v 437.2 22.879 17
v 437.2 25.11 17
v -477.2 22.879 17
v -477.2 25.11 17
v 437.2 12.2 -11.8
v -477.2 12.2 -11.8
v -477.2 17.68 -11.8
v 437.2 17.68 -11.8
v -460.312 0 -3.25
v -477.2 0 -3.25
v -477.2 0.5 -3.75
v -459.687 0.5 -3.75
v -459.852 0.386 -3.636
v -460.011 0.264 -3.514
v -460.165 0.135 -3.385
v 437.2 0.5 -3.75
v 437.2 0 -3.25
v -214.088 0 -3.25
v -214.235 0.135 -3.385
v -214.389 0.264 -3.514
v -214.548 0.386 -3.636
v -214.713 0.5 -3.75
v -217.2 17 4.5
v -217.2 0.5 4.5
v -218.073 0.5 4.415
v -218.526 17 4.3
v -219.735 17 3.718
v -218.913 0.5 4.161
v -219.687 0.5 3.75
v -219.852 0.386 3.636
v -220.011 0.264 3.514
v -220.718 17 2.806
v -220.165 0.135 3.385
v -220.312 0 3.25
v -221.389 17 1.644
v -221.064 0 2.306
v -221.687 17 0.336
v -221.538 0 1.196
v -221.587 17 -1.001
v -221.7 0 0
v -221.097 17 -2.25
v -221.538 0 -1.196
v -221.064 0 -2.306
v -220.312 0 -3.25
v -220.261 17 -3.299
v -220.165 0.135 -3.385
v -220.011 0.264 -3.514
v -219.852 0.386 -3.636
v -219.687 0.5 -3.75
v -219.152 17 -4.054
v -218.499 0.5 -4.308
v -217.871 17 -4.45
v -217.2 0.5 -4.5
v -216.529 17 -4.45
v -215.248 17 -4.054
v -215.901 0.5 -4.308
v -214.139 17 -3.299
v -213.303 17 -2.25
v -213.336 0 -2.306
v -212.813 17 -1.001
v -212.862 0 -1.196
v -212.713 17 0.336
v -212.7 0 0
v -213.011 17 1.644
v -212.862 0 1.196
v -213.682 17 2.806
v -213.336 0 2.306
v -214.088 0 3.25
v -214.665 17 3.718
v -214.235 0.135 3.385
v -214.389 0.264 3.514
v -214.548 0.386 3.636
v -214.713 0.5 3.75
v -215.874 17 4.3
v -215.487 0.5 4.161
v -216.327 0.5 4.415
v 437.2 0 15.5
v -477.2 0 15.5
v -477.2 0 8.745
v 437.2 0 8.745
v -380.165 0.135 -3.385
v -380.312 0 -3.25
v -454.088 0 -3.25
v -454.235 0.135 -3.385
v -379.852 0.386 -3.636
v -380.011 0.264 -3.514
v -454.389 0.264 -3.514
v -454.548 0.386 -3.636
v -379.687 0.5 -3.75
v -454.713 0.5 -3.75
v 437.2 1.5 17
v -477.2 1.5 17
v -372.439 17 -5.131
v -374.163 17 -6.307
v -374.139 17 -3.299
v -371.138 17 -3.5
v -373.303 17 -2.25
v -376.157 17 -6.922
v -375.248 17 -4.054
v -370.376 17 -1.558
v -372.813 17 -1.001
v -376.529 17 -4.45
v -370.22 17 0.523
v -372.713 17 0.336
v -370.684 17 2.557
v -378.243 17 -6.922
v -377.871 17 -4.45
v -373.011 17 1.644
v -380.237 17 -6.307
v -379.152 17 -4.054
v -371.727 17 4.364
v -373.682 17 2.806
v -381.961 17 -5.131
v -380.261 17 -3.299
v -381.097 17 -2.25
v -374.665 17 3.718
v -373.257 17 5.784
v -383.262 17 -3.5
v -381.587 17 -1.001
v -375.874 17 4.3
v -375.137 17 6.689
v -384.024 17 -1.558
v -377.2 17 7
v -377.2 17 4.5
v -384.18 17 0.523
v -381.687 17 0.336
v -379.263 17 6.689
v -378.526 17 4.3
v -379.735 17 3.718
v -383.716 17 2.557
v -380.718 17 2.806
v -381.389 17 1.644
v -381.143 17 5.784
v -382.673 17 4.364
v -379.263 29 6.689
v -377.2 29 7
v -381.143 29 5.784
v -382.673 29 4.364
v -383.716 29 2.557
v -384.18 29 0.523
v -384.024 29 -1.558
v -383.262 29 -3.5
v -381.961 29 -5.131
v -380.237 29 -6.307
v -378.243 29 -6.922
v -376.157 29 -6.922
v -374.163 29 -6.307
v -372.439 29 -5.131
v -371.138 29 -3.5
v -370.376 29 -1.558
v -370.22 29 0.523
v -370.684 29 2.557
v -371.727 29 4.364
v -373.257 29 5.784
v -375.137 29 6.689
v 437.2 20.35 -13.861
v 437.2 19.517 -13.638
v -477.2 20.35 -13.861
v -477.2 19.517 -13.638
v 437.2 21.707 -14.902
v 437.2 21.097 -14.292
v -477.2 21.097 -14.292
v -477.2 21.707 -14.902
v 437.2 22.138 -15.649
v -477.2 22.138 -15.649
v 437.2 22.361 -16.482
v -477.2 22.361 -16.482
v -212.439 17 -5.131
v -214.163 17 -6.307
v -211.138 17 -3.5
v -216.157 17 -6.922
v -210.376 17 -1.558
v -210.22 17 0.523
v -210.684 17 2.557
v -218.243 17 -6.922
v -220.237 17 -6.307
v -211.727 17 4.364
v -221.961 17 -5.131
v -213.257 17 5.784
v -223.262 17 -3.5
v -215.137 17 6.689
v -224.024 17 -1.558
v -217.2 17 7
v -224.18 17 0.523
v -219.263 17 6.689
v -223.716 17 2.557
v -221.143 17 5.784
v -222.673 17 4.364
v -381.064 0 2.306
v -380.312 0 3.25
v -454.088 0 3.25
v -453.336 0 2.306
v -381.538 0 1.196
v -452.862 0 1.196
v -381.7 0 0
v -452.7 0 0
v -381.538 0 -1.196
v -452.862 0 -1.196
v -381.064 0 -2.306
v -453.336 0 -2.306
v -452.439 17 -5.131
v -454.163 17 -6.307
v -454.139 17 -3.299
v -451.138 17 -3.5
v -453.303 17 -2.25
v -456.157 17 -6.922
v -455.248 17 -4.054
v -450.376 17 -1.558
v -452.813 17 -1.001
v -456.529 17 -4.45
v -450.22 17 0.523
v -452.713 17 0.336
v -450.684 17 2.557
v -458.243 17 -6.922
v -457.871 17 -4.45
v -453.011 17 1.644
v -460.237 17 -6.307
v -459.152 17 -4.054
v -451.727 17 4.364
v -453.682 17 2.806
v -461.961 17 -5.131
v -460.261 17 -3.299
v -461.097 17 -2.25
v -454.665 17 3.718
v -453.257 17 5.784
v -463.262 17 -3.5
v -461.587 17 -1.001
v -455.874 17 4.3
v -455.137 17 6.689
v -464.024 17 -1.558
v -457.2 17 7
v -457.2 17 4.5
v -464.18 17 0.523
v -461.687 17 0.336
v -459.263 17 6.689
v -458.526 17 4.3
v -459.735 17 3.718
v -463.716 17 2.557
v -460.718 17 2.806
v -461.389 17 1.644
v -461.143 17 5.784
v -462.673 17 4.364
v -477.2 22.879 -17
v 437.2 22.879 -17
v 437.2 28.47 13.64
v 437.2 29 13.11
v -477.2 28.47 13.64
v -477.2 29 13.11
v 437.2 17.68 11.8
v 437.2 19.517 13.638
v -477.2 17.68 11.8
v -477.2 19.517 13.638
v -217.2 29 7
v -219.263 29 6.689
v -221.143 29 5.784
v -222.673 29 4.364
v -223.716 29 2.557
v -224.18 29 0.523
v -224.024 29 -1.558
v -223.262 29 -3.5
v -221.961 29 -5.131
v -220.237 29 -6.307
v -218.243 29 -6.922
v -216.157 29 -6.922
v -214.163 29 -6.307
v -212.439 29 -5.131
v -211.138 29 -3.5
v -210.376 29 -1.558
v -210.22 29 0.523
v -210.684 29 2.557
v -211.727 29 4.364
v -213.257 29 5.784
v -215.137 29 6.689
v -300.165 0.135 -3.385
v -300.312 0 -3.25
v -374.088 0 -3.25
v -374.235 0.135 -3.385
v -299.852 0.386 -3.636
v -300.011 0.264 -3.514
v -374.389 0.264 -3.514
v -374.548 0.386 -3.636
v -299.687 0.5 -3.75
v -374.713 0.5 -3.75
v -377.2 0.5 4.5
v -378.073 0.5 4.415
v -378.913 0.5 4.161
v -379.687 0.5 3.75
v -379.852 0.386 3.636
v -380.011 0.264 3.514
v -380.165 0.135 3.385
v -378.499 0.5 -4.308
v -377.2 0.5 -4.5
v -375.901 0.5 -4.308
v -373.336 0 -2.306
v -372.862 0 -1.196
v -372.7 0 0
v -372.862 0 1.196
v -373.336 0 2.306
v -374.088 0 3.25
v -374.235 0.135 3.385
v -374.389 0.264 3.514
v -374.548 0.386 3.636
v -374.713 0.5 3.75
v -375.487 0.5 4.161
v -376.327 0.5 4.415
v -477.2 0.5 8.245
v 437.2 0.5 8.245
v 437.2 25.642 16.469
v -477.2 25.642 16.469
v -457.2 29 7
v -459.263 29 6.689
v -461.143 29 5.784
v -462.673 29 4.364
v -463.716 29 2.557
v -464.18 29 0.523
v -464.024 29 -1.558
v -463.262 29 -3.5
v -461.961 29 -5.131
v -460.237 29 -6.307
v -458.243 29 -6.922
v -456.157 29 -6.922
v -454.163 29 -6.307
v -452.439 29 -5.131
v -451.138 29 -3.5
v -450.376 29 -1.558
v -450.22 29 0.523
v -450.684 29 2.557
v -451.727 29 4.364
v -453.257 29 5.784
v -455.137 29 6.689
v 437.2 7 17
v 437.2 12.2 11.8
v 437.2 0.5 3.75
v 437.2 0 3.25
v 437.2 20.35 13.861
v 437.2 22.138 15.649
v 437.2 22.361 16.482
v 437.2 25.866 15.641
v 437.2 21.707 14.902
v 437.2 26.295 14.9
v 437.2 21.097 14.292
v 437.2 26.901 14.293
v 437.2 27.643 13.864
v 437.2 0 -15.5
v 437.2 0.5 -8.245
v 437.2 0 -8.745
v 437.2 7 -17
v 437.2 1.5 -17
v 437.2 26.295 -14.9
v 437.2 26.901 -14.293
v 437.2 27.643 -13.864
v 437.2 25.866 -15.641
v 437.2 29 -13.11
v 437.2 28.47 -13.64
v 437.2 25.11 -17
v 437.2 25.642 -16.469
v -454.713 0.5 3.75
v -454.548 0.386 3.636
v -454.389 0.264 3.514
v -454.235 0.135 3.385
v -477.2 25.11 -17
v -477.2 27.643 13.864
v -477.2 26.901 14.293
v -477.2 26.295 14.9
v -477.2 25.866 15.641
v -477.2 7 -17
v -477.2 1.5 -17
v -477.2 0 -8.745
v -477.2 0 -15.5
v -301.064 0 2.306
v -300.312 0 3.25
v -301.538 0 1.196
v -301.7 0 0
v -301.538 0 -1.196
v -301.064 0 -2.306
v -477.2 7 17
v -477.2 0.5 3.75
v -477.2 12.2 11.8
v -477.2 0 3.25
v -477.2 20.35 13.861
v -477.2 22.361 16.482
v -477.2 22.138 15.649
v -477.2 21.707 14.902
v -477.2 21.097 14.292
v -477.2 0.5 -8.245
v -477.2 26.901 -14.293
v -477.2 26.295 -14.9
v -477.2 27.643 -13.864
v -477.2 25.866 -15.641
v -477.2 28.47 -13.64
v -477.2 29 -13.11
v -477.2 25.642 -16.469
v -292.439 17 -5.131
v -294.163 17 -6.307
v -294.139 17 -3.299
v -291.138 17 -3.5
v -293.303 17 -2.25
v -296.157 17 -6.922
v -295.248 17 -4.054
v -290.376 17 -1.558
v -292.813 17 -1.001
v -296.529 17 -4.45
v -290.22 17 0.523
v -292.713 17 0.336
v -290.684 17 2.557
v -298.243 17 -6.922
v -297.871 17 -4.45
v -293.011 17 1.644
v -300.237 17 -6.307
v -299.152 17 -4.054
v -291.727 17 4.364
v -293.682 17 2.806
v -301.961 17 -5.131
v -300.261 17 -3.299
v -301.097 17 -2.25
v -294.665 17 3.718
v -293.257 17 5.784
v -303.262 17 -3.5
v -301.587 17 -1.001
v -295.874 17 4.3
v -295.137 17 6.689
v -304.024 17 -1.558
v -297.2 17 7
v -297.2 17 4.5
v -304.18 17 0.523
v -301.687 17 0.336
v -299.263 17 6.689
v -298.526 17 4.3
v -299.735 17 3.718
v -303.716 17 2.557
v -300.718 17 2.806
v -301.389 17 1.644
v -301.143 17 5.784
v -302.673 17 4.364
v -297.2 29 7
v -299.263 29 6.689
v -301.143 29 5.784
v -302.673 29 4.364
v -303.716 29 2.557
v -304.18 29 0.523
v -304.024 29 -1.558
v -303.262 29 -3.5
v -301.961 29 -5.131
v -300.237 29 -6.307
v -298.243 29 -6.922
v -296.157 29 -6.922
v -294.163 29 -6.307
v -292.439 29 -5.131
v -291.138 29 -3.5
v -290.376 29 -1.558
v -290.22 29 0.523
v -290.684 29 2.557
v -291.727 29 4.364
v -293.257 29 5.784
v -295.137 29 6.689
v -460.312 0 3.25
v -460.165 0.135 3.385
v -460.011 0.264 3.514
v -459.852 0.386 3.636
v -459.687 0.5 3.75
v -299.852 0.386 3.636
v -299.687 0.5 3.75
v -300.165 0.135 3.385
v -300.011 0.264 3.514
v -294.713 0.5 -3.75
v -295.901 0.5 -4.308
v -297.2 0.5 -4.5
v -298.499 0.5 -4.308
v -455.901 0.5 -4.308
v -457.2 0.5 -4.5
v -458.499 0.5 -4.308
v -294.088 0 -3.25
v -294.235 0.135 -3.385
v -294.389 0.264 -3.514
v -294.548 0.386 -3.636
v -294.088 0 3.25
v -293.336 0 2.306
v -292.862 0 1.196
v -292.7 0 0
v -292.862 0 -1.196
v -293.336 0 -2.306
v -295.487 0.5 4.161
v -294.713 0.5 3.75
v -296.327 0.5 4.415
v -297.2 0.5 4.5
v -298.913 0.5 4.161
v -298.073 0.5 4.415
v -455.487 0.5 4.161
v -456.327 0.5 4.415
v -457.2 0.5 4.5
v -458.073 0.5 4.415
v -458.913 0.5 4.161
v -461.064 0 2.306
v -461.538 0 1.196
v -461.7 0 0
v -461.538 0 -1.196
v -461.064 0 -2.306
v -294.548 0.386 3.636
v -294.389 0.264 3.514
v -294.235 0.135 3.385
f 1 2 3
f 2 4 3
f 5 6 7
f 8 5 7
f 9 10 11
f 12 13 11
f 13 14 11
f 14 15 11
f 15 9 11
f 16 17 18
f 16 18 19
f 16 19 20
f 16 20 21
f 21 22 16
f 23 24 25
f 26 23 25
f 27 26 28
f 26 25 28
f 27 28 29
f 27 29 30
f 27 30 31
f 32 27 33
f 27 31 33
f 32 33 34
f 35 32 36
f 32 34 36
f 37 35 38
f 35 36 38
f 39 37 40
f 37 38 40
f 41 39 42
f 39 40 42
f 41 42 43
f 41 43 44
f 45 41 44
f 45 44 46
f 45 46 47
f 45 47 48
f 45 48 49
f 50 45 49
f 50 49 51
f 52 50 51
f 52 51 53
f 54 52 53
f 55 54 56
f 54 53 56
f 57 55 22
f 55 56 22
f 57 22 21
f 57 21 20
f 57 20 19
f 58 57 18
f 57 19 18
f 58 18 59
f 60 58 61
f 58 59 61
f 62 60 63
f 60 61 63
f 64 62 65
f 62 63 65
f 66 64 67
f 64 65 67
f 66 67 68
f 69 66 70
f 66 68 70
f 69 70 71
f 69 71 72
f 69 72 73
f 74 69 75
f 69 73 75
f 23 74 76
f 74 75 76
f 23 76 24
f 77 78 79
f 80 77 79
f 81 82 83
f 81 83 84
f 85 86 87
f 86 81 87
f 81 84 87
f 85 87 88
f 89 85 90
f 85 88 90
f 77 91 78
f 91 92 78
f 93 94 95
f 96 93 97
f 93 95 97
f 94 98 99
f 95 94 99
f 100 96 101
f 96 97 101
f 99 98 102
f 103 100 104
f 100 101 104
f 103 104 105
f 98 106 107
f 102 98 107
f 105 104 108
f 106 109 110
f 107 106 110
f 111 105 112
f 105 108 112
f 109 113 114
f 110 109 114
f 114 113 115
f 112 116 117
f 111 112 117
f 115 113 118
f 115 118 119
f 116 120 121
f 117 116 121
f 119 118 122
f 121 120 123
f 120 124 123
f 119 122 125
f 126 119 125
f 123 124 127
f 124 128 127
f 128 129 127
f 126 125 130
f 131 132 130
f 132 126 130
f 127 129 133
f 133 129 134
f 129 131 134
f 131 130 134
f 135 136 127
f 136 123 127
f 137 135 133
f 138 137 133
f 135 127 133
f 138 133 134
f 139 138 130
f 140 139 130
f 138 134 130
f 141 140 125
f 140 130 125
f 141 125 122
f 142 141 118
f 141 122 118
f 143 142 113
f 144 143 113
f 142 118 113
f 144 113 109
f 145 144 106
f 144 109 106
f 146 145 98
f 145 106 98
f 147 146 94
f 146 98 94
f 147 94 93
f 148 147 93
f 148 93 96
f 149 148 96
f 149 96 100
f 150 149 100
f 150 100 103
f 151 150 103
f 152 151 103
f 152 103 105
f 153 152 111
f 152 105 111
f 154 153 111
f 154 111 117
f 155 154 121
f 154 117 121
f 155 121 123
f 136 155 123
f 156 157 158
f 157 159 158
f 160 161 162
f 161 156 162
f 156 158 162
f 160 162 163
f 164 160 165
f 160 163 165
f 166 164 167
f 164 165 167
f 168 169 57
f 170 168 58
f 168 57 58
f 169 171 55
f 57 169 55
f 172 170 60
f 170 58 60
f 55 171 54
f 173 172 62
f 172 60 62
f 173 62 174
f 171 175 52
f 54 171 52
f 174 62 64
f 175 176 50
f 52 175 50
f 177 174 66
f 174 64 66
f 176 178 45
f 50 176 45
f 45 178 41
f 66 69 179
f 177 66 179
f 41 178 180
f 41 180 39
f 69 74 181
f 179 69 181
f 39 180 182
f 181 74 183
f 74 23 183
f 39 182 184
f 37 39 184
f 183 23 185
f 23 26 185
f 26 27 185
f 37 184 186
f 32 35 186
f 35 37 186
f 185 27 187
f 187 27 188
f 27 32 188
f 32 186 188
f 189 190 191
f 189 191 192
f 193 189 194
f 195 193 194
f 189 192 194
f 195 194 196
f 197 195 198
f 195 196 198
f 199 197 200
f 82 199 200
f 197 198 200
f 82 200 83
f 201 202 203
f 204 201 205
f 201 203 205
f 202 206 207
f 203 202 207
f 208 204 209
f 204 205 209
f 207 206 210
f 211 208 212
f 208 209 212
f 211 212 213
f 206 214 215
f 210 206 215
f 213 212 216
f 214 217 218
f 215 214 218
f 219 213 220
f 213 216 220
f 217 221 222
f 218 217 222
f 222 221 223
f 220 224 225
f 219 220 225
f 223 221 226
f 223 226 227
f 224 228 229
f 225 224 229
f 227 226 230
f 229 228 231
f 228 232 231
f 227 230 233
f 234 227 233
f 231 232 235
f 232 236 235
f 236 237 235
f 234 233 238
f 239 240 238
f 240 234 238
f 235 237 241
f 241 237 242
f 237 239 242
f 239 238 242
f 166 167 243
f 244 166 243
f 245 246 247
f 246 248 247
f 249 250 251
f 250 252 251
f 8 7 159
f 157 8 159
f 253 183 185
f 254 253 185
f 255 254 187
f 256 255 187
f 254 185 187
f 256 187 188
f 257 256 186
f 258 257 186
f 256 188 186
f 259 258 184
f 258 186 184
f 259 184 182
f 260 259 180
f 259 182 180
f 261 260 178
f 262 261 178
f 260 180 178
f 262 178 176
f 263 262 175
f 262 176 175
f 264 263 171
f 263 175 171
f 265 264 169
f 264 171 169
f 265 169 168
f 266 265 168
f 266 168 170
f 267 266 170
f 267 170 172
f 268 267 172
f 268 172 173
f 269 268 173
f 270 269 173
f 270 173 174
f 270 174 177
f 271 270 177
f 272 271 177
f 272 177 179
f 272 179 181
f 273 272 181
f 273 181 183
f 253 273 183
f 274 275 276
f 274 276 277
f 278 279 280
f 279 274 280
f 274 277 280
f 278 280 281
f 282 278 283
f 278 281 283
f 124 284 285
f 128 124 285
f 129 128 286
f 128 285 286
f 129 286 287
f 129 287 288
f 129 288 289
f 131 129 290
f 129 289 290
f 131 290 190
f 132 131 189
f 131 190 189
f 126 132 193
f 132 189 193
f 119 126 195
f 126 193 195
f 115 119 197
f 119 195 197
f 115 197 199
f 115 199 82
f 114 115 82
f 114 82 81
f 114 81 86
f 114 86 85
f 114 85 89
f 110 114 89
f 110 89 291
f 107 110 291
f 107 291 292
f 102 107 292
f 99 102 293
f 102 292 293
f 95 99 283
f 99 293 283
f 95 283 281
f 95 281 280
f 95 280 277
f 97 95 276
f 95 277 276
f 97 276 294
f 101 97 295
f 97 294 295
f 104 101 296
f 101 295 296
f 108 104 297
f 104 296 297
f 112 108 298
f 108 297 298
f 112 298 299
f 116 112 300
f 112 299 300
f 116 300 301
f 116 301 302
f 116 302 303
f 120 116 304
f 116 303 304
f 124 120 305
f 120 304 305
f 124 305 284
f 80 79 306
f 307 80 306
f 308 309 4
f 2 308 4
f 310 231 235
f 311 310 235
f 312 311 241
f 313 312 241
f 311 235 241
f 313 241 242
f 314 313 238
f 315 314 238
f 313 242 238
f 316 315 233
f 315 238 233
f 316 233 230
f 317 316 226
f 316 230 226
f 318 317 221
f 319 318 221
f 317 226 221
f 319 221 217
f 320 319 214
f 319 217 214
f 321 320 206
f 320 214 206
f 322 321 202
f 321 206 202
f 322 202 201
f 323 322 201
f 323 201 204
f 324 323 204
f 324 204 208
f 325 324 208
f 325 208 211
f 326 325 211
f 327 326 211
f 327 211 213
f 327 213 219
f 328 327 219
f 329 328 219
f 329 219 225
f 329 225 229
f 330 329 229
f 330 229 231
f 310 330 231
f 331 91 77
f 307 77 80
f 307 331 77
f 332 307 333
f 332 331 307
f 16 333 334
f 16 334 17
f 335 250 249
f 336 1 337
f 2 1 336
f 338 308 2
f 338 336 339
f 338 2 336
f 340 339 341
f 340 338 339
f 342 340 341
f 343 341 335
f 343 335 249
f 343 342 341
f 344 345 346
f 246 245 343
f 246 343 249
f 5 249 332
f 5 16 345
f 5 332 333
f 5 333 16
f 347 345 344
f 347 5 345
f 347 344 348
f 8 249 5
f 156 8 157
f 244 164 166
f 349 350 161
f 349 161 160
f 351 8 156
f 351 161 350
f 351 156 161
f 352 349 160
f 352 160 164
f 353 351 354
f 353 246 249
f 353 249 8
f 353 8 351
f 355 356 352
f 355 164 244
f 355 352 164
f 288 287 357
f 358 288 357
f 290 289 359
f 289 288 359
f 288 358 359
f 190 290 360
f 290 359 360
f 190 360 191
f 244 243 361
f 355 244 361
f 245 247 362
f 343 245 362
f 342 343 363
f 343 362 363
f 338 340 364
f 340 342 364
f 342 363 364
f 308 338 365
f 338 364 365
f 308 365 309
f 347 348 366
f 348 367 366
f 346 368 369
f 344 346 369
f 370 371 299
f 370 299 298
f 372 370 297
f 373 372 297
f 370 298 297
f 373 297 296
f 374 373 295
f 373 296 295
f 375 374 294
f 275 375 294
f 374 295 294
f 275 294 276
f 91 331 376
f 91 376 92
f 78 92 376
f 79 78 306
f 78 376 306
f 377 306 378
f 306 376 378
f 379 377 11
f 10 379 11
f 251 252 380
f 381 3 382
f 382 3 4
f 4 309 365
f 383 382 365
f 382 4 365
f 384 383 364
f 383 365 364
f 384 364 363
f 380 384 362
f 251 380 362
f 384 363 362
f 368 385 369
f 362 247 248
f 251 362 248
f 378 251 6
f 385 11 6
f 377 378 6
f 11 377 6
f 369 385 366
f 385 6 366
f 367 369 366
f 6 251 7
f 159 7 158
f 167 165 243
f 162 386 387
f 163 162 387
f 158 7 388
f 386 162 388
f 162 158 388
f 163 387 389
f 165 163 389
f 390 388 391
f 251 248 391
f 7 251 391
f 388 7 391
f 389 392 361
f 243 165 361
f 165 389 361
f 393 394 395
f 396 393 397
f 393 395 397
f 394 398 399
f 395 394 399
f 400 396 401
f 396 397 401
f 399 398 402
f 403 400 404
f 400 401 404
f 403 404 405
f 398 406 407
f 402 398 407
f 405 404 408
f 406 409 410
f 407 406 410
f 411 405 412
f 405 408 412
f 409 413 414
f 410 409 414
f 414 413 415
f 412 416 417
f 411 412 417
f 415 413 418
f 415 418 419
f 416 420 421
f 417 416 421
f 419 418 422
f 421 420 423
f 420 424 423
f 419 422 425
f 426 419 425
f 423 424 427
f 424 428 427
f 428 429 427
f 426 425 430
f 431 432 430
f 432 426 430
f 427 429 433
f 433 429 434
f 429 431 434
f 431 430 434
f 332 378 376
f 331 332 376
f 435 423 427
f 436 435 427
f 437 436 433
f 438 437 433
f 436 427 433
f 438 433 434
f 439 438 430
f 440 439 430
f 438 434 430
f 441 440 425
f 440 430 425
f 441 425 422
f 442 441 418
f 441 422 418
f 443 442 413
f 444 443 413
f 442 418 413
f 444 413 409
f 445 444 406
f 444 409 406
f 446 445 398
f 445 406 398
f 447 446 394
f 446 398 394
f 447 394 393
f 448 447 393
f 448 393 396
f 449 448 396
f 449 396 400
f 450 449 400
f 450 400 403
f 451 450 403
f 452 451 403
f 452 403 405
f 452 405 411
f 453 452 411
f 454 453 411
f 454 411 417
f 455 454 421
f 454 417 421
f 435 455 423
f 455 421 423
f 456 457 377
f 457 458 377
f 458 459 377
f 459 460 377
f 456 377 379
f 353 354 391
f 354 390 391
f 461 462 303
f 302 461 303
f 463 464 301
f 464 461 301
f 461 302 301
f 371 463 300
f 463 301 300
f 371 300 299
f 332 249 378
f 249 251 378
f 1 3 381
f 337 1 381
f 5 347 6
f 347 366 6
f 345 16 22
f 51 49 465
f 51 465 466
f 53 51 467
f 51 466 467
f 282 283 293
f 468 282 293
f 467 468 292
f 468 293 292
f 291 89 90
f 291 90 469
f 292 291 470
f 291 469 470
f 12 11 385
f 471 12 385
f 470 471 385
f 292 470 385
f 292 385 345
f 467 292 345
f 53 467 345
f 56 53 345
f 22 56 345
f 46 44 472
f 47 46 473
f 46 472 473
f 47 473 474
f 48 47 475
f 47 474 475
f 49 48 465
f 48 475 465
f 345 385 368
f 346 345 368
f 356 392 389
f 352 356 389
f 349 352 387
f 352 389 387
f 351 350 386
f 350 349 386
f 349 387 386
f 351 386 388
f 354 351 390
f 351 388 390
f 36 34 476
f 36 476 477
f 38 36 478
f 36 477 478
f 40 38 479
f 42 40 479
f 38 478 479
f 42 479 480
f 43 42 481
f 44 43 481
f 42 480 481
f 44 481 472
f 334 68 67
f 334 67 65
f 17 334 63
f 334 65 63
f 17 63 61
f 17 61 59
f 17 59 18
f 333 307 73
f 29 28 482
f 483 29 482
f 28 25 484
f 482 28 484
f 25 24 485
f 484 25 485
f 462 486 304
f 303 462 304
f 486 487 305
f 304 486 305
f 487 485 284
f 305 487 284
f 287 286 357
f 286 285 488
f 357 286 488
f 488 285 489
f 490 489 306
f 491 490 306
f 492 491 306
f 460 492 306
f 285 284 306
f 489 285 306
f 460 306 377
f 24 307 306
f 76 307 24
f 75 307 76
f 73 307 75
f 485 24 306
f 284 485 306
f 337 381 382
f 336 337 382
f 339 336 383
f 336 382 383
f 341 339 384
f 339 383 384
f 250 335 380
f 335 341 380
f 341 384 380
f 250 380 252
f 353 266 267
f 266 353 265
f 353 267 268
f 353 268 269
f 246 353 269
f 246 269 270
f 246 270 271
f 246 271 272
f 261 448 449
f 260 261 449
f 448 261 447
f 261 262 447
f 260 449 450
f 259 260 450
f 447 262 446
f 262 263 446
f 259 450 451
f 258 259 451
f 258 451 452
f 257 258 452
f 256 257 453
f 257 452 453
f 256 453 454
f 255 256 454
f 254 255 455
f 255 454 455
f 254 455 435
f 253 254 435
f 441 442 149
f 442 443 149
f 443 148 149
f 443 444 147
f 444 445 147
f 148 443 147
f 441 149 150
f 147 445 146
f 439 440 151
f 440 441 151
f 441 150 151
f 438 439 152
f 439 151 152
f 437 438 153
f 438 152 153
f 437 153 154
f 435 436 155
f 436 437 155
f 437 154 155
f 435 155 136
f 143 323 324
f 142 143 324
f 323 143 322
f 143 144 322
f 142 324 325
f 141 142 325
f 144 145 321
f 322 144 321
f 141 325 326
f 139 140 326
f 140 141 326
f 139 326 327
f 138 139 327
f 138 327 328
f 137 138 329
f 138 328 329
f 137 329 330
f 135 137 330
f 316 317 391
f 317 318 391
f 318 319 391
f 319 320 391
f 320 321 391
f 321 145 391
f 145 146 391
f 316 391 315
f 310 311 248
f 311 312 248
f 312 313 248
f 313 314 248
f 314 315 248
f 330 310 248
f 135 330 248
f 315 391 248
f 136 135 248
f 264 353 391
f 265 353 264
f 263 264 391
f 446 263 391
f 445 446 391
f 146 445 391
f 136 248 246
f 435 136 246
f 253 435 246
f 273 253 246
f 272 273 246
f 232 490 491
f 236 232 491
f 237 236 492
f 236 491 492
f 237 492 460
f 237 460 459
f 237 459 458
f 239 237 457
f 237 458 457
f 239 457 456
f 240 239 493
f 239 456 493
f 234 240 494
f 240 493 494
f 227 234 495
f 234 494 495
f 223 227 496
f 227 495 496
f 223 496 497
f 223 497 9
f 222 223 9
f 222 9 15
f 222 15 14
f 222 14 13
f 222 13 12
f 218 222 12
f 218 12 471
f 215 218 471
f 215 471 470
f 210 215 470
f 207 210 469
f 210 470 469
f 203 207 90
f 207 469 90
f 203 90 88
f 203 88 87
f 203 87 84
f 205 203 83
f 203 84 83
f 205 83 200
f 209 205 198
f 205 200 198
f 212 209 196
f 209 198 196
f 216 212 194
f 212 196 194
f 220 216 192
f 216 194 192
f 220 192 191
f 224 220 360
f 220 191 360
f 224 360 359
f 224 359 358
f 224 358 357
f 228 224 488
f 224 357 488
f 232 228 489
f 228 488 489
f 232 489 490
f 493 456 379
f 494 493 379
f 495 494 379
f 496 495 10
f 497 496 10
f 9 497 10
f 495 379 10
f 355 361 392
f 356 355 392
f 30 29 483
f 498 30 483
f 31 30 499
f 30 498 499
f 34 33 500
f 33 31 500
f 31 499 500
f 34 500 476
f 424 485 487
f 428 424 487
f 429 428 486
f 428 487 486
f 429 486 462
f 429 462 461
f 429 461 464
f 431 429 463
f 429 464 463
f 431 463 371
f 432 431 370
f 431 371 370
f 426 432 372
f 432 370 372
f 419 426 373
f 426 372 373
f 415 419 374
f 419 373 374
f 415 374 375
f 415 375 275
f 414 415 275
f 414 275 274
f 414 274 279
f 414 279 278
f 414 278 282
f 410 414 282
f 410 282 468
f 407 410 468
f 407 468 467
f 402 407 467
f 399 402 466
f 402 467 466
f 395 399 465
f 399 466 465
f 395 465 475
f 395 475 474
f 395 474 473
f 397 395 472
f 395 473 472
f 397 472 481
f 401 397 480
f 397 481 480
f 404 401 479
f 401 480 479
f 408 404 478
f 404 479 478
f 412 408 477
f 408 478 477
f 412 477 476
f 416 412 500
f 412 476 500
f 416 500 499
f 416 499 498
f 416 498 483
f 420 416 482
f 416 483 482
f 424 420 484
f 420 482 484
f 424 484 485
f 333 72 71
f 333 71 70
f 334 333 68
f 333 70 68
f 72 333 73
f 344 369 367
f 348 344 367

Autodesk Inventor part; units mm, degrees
sketch "Sketch_18" plane through (-20, 0, 0) normal (1, 0, 0) x (0, 0, -1)
  line L0 (-17, 1.5) -> (-15.5, 0)
  line L1 (-15.5, 0) -> (-8.745, 0)
  line L2 (-8.745, 0) -> (-8.245, 0.5)
  line L3 (-8.245, 0.5) -> (-3.75, 0.5)
  line L4 (-3.75, 0.5) -> (-3.25, 0)
  line L5 (-3.25, 0) -> (3.25, 0)
  line L6 (3.25, 0) -> (3.75, 0.5)
  line L7 (3.75, 0.5) -> (8.245, 0.5)
  line L8 (8.245, 0.5) -> (8.745, 0)
  line L9 (8.745, 0) -> (15.5, 0)
  line L10 (15.5, 0) -> (17, 1.5)
  line L11 (17, 1.5) -> (17, 7.0002)
  line L12 (17, 7.0002) -> (11.8003, 12.1999)
  line L13 (11.8003, 12.1999) -> (11.8003, 17.6796)
  line L14 (11.8003, 17.6796) -> (13.6381, 19.5174)
  arc A0 (16.4816, 22.3609) -> (13.6381, 19.5174) centre (16.9102, 19.0889) ccw
  line L15 (16.4816, 22.3609) -> (17, 22.8793)
  line L16 (17, 22.8793) -> (17, 25.1102)
  line L17 (17, 25.1102) -> (16.4686, 25.6415)
  arc A1 (13.6398, 28.4703) -> (16.4686, 25.6415) centre (16.9102, 28.9119) ccw
  line L18 (13.6398, 28.4703) -> (13.1102, 29)
  line L19 (13.1102, 29) -> (-13.1102, 29)
  line L20 (-13.1102, 29) -> (-13.6398, 28.4703)
  arc A2 (-16.4686, 25.6415) -> (-13.6398, 28.4703) centre (-16.9102, 28.9119) ccw
  line L21 (-16.4686, 25.6415) -> (-17, 25.1102)
  line L22 (-17, 25.1102) -> (-17, 22.8793)
  line L23 (-17, 22.8793) -> (-16.4816, 22.3609)
  arc A3 (-13.6381, 19.5174) -> (-16.4816, 22.3609) centre (-16.9102, 19.0889) ccw
  line L24 (-13.6381, 19.5174) -> (-11.8003, 17.6796)
  line L25 (-11.8003, 17.6796) -> (-11.8003, 12.1999)
  line L26 (-11.8003, 12.1999) -> (-17, 7.0002)
  line L27 (-17, 7.0002) -> (-17, 1.5)
extrude "Extrusion1" add sketch "Sketch_18" along normal mid plane 914.4
sketch "Sketch2" plane through (-477.2, 29, 13.1102) normal (0, 1, 0) x (1, 0, 0)
  point P0 (20, 13.1102)
hole "Hole1" at (-457.2, 29, 0) direction (0, -1, 0) diameter 9 depth 29 counterbore diameter 14 counterbore depth 12
pattern_linear "Rectangular Pattern1" count 4 spacing 80 along (1, 0, 0) of "Hole1"
ref_plane "4dummy_XY" through (0, 0, 0) normal (1, 0, 0) x (0, 0, -1)
ref_plane "4dummy_YZ" through (0, 0, 0) normal (0, 0, -1) x (0, 1, 0)
ref_plane "4dummy_ZX" through (0, 0, 0) normal (0, 1, 0) x (1, 0, 0)
ref_plane "4slide_XY" through (-20, 7.5, 0) normal (1, 0, 0) x (0, 0, -1)
ref_plane "4slide_YZ" through (-20, 7.5, 0) normal (0, 0, -1) x (0, 1, 0)
ref_plane "4slide_ZX" through (-20, 7.5, 0) normal (0, 1, 0) x (1, 0, 0)
ref_plane "4track_XY" through (0, 0, 0) normal (0, 0, 1) x (1, 0, 0)
ref_plane "4track_YZ" through (0, 0, 0) normal (1, 0, 0) x (0, 1, 0)
ref_plane "4track_ZX" through (0, 0, 0) normal (0, 1, 0) x (0, 0, 1)
properties part number "HSR35R128020 Rail"
